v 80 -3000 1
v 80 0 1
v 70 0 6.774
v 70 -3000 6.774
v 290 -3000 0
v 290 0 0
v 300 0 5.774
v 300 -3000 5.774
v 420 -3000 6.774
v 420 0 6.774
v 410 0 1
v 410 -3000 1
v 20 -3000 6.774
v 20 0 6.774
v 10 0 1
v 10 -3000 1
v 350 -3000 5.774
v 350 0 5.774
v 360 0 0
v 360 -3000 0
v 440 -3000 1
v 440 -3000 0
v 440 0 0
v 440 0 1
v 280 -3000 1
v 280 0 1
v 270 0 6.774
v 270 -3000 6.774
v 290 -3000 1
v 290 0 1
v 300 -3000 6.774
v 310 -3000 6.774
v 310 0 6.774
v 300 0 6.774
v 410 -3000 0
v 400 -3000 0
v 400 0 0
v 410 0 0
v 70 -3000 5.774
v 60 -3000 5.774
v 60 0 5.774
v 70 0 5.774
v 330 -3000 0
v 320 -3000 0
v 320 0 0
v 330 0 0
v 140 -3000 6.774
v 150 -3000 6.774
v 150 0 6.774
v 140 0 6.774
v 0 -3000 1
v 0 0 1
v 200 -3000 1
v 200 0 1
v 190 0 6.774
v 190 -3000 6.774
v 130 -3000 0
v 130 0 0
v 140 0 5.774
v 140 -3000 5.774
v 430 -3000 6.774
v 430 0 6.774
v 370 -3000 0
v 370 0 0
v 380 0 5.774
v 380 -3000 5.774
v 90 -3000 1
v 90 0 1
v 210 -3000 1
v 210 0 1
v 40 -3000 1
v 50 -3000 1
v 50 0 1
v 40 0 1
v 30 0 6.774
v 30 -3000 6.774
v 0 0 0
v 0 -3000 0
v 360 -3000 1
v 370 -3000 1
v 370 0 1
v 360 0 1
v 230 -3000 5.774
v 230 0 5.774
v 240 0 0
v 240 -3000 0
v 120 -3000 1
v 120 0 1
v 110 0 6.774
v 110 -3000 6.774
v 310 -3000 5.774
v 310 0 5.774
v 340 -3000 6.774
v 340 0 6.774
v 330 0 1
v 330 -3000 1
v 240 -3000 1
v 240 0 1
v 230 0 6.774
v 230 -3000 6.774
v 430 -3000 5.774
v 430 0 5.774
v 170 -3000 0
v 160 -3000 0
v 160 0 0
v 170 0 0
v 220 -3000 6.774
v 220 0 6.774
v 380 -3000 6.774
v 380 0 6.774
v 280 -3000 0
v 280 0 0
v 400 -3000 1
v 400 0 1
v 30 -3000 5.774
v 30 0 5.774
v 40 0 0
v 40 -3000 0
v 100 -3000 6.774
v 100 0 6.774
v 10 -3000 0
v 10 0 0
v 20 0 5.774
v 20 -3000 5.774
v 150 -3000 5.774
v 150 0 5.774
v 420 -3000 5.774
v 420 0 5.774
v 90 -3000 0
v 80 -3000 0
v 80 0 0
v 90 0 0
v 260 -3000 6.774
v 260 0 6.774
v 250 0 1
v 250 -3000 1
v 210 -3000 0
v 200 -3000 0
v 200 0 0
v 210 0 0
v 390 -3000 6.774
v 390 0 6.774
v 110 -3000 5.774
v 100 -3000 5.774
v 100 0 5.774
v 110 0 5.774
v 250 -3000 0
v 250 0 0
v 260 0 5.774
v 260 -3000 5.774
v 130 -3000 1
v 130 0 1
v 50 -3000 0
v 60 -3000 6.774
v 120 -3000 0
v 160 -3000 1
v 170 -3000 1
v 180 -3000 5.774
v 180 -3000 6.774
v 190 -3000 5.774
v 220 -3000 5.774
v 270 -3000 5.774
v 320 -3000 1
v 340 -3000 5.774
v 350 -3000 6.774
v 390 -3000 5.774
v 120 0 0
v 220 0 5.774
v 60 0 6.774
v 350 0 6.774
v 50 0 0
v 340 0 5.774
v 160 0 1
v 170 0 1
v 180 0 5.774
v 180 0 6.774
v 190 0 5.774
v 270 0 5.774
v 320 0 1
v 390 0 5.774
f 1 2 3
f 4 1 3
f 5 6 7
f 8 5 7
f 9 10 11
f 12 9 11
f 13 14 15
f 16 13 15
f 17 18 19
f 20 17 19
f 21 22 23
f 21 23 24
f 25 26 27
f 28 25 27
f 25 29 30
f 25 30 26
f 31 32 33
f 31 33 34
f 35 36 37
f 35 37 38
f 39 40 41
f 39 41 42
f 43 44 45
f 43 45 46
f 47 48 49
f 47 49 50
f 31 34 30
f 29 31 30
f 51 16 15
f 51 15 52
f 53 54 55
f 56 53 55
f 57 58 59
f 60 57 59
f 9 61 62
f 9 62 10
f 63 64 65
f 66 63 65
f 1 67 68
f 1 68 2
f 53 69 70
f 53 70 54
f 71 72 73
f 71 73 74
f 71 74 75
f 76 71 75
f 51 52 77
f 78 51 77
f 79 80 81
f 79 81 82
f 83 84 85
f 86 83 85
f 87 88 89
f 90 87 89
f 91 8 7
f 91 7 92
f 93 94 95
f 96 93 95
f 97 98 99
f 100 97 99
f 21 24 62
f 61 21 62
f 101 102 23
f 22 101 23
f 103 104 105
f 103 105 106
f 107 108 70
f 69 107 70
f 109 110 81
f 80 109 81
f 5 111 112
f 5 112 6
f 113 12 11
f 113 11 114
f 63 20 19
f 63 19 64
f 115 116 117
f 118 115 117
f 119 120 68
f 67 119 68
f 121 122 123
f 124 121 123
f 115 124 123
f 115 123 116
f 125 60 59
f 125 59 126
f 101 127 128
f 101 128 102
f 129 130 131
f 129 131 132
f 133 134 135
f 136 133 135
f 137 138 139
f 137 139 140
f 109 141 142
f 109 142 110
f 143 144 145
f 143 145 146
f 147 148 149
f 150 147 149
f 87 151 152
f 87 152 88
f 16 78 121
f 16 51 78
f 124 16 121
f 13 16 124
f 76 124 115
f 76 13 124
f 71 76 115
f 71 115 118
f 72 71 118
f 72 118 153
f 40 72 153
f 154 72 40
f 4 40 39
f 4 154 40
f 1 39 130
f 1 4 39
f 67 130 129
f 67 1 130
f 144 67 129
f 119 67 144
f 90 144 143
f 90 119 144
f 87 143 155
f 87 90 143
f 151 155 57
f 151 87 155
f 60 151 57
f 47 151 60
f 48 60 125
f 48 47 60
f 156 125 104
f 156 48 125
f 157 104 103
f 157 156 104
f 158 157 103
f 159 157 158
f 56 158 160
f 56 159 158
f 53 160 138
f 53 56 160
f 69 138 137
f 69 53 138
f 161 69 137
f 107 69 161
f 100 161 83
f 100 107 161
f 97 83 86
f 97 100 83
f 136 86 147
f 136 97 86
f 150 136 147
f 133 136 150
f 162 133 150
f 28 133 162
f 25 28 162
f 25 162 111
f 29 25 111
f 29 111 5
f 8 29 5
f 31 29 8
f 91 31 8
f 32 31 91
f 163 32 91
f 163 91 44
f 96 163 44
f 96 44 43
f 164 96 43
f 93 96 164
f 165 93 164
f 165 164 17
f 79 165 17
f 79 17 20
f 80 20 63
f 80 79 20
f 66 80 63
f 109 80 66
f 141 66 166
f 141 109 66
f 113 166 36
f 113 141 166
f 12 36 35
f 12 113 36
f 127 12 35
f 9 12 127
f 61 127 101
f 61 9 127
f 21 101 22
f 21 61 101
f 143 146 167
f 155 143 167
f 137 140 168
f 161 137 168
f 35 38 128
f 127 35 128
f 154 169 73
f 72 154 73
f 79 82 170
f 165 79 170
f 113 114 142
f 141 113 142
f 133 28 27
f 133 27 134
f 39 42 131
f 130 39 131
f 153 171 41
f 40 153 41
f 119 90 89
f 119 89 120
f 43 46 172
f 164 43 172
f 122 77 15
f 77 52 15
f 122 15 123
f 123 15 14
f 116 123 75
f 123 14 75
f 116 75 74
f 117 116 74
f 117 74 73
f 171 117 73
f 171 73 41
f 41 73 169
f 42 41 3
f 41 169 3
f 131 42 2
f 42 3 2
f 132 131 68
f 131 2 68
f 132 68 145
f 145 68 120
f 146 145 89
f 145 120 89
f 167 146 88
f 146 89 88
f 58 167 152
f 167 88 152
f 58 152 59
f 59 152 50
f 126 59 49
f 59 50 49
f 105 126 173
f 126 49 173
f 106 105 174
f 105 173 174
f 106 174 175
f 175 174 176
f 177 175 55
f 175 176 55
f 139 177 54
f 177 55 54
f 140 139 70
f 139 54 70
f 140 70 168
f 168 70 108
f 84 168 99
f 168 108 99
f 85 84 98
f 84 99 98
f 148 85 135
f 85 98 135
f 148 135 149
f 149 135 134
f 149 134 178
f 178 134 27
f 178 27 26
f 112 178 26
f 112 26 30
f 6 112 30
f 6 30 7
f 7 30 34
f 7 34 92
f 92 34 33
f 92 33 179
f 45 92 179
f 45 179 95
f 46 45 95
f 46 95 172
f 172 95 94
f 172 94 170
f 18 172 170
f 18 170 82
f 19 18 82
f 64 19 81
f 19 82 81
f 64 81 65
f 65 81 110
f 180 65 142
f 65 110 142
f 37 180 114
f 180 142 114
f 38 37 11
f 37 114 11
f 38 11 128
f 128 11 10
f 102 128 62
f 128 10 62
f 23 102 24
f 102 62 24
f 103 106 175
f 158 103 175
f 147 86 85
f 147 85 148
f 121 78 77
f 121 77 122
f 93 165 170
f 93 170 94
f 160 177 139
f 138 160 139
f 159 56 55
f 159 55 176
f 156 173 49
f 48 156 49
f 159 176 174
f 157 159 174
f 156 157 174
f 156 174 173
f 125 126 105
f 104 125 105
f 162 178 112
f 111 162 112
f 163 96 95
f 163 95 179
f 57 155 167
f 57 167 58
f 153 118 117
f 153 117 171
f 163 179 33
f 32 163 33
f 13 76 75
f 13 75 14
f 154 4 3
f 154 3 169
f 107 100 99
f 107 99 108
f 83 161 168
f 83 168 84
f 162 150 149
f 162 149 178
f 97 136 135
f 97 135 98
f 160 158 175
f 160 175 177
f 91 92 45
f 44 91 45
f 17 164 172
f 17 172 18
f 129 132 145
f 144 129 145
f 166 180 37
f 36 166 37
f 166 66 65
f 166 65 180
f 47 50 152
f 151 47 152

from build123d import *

# Parameters (mm, degrees)
PAD_DEPTH = 3000


with BuildPart() as part:
    # Sketch → Pad (new body)
    with BuildSketch(Plane.XZ):
        Polygon((0, 0), (10, 0), (20, 5.773503), (30, 5.773503), (40, 0), (50, 0), (60, 5.773503), (70, 5.773503), (80, 0), (90, 0), (100, 5.773503), (110, 5.773503), (120, 0), (130, 0), (140, 5.773503), (150, 5.773503), (160, 0), (170, 0), (180, 5.773503), (190, 5.773503), (200, 0), (210, 0), (220, 5.773503), (230, 5.773503), (240, 0), (250, 0), (260, 5.773503), (270, 5.773503), (280, 0), (290, 0), (300, 5.773503), (310, 5.773503), (320, 0), (330, 0), (340, 5.773503), (350, 5.773503), (360, 0), (370, 0), (380, 5.773503), (390, 5.773503), (400, 0), (410, 0), (420, 5.773503), (430, 5.773503), (440, 0), (440, 1), (430, 6.773503), (420, 6.773503), (410, 1), (400, 1), (390, 6.773503), (380, 6.773503), (370, 1), (360, 1), (350, 6.773503), (340, 6.773503), (330, 1), (320, 1), (310, 6.773503), (300, 6.773503), (290, 1), (280, 1), (270, 6.773503), (260, 6.773503), (250, 1), (240, 1), (230, 6.773503), (220, 6.773503), (210, 1), (200, 1), (190, 6.773503), (180, 6.773503), (170, 1), (160, 1), (150, 6.773503), (140, 6.773503), (130, 1), (120, 1), (110, 6.773503), (100, 6.773503), (90, 1), (80, 1), (70, 6.773503), (60, 6.773503), (50, 1), (40, 1), (30, 6.773503), (20, 6.773503), (10, 1), (0, 1), align=None)
    extrude(amount=PAD_DEPTH)


solid = part.part
